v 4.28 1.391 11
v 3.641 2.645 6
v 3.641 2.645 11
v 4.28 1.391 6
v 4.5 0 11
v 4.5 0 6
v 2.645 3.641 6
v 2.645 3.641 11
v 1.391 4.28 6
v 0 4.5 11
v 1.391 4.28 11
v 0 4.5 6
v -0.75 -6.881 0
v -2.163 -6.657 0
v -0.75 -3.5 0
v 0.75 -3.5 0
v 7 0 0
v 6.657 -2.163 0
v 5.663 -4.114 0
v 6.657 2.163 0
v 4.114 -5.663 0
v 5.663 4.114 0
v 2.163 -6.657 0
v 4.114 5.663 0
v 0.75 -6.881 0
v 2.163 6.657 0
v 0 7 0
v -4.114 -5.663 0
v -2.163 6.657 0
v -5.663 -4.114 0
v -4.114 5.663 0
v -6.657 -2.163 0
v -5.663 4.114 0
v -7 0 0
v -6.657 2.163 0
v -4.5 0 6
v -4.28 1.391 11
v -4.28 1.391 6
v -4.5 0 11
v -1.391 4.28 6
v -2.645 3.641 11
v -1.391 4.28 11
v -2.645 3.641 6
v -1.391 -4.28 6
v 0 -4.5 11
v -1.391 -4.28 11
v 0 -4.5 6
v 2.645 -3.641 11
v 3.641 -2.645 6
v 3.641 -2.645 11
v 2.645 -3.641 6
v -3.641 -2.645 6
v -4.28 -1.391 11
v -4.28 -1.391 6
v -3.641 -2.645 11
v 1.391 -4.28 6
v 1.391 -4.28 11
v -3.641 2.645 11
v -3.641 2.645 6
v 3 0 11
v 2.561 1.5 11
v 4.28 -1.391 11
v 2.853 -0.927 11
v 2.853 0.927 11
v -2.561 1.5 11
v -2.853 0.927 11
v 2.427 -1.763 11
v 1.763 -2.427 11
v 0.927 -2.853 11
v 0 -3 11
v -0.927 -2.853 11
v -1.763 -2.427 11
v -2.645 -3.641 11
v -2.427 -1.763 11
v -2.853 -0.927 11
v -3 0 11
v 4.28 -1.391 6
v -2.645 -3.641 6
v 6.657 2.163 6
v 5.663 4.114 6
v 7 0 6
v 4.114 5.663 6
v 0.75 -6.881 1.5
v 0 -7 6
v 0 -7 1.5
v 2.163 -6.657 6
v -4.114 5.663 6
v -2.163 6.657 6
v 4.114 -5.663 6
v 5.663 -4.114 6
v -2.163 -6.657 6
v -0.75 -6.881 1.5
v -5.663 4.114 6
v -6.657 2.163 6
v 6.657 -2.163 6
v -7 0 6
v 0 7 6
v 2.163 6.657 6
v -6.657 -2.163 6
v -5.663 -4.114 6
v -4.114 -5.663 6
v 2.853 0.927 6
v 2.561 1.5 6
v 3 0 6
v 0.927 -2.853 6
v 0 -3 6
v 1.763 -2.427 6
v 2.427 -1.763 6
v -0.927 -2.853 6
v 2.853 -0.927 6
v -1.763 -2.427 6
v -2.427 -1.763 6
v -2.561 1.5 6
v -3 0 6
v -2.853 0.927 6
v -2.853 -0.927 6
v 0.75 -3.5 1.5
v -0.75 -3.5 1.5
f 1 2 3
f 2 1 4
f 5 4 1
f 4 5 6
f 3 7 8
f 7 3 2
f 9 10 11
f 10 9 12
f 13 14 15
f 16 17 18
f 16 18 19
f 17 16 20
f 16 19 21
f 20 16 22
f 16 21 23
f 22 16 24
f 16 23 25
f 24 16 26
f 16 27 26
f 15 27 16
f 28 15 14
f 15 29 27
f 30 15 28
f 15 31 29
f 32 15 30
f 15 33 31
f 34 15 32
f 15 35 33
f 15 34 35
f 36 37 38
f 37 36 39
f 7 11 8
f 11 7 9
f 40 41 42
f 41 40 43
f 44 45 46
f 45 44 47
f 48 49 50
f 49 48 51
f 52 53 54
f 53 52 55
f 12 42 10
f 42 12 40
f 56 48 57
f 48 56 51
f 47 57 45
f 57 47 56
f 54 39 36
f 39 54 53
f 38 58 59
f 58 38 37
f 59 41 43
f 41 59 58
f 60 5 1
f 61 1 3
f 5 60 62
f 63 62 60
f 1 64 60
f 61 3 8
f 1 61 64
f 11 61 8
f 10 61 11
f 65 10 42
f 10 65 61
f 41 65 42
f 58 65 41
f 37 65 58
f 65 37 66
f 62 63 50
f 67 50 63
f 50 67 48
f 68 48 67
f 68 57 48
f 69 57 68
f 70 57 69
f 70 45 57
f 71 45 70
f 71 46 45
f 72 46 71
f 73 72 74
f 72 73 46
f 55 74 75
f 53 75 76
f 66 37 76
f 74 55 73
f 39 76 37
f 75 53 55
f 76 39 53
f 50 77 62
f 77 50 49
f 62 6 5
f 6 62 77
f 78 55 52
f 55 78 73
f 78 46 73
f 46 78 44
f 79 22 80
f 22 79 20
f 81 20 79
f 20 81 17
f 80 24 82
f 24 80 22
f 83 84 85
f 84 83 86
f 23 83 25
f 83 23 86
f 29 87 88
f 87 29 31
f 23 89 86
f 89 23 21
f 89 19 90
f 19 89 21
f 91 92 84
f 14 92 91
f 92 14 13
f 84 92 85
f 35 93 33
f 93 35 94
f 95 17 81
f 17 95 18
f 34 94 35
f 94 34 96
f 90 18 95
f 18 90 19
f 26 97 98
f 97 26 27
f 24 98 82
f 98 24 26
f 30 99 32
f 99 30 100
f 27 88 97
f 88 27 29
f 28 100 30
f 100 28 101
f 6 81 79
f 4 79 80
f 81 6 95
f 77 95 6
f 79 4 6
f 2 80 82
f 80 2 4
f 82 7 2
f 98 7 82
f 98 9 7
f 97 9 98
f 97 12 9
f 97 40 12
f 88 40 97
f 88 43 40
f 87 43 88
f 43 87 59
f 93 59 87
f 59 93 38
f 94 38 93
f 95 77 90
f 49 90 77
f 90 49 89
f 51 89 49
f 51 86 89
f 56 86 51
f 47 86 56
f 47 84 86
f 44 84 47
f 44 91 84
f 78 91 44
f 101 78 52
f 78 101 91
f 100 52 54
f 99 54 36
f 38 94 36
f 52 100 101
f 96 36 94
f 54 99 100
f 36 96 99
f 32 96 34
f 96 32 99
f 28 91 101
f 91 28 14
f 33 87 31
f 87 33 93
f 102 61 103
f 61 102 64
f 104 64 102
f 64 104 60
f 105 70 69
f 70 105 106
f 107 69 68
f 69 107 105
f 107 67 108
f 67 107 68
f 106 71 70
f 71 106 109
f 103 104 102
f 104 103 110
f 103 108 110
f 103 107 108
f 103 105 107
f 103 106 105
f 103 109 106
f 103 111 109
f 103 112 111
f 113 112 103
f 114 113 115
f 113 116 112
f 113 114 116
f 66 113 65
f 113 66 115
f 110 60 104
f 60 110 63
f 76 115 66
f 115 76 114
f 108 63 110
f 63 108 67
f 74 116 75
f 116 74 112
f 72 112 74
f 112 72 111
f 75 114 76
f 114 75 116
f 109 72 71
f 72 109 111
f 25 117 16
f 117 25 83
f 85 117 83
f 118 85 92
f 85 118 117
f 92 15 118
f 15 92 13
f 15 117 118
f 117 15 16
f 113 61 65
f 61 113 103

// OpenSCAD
// Knapp till christoffer och emmie

innerradie=6/2;
spar=6-4.5;
wall=1.5;
h = 11;
h2 = 6;
res = 20;
knappradie = 14/2;


union() {
    difference() {
        union() {
        cylinder(h=h, r=innerradie+wall, $fn=res);
        cylinder(h=h2, r= knappradie, $fn=res);
        }
        translate([0,0,h2])cylinder(h=h, r=innerradie, $fn=res);
        translate([-wall/2, -h2-knappradie/2,0]) cube([wall,h2,wall]);
    }
    
    translate([-innerradie,spar,0]) cube([innerradie*2,wall,h]);
}
